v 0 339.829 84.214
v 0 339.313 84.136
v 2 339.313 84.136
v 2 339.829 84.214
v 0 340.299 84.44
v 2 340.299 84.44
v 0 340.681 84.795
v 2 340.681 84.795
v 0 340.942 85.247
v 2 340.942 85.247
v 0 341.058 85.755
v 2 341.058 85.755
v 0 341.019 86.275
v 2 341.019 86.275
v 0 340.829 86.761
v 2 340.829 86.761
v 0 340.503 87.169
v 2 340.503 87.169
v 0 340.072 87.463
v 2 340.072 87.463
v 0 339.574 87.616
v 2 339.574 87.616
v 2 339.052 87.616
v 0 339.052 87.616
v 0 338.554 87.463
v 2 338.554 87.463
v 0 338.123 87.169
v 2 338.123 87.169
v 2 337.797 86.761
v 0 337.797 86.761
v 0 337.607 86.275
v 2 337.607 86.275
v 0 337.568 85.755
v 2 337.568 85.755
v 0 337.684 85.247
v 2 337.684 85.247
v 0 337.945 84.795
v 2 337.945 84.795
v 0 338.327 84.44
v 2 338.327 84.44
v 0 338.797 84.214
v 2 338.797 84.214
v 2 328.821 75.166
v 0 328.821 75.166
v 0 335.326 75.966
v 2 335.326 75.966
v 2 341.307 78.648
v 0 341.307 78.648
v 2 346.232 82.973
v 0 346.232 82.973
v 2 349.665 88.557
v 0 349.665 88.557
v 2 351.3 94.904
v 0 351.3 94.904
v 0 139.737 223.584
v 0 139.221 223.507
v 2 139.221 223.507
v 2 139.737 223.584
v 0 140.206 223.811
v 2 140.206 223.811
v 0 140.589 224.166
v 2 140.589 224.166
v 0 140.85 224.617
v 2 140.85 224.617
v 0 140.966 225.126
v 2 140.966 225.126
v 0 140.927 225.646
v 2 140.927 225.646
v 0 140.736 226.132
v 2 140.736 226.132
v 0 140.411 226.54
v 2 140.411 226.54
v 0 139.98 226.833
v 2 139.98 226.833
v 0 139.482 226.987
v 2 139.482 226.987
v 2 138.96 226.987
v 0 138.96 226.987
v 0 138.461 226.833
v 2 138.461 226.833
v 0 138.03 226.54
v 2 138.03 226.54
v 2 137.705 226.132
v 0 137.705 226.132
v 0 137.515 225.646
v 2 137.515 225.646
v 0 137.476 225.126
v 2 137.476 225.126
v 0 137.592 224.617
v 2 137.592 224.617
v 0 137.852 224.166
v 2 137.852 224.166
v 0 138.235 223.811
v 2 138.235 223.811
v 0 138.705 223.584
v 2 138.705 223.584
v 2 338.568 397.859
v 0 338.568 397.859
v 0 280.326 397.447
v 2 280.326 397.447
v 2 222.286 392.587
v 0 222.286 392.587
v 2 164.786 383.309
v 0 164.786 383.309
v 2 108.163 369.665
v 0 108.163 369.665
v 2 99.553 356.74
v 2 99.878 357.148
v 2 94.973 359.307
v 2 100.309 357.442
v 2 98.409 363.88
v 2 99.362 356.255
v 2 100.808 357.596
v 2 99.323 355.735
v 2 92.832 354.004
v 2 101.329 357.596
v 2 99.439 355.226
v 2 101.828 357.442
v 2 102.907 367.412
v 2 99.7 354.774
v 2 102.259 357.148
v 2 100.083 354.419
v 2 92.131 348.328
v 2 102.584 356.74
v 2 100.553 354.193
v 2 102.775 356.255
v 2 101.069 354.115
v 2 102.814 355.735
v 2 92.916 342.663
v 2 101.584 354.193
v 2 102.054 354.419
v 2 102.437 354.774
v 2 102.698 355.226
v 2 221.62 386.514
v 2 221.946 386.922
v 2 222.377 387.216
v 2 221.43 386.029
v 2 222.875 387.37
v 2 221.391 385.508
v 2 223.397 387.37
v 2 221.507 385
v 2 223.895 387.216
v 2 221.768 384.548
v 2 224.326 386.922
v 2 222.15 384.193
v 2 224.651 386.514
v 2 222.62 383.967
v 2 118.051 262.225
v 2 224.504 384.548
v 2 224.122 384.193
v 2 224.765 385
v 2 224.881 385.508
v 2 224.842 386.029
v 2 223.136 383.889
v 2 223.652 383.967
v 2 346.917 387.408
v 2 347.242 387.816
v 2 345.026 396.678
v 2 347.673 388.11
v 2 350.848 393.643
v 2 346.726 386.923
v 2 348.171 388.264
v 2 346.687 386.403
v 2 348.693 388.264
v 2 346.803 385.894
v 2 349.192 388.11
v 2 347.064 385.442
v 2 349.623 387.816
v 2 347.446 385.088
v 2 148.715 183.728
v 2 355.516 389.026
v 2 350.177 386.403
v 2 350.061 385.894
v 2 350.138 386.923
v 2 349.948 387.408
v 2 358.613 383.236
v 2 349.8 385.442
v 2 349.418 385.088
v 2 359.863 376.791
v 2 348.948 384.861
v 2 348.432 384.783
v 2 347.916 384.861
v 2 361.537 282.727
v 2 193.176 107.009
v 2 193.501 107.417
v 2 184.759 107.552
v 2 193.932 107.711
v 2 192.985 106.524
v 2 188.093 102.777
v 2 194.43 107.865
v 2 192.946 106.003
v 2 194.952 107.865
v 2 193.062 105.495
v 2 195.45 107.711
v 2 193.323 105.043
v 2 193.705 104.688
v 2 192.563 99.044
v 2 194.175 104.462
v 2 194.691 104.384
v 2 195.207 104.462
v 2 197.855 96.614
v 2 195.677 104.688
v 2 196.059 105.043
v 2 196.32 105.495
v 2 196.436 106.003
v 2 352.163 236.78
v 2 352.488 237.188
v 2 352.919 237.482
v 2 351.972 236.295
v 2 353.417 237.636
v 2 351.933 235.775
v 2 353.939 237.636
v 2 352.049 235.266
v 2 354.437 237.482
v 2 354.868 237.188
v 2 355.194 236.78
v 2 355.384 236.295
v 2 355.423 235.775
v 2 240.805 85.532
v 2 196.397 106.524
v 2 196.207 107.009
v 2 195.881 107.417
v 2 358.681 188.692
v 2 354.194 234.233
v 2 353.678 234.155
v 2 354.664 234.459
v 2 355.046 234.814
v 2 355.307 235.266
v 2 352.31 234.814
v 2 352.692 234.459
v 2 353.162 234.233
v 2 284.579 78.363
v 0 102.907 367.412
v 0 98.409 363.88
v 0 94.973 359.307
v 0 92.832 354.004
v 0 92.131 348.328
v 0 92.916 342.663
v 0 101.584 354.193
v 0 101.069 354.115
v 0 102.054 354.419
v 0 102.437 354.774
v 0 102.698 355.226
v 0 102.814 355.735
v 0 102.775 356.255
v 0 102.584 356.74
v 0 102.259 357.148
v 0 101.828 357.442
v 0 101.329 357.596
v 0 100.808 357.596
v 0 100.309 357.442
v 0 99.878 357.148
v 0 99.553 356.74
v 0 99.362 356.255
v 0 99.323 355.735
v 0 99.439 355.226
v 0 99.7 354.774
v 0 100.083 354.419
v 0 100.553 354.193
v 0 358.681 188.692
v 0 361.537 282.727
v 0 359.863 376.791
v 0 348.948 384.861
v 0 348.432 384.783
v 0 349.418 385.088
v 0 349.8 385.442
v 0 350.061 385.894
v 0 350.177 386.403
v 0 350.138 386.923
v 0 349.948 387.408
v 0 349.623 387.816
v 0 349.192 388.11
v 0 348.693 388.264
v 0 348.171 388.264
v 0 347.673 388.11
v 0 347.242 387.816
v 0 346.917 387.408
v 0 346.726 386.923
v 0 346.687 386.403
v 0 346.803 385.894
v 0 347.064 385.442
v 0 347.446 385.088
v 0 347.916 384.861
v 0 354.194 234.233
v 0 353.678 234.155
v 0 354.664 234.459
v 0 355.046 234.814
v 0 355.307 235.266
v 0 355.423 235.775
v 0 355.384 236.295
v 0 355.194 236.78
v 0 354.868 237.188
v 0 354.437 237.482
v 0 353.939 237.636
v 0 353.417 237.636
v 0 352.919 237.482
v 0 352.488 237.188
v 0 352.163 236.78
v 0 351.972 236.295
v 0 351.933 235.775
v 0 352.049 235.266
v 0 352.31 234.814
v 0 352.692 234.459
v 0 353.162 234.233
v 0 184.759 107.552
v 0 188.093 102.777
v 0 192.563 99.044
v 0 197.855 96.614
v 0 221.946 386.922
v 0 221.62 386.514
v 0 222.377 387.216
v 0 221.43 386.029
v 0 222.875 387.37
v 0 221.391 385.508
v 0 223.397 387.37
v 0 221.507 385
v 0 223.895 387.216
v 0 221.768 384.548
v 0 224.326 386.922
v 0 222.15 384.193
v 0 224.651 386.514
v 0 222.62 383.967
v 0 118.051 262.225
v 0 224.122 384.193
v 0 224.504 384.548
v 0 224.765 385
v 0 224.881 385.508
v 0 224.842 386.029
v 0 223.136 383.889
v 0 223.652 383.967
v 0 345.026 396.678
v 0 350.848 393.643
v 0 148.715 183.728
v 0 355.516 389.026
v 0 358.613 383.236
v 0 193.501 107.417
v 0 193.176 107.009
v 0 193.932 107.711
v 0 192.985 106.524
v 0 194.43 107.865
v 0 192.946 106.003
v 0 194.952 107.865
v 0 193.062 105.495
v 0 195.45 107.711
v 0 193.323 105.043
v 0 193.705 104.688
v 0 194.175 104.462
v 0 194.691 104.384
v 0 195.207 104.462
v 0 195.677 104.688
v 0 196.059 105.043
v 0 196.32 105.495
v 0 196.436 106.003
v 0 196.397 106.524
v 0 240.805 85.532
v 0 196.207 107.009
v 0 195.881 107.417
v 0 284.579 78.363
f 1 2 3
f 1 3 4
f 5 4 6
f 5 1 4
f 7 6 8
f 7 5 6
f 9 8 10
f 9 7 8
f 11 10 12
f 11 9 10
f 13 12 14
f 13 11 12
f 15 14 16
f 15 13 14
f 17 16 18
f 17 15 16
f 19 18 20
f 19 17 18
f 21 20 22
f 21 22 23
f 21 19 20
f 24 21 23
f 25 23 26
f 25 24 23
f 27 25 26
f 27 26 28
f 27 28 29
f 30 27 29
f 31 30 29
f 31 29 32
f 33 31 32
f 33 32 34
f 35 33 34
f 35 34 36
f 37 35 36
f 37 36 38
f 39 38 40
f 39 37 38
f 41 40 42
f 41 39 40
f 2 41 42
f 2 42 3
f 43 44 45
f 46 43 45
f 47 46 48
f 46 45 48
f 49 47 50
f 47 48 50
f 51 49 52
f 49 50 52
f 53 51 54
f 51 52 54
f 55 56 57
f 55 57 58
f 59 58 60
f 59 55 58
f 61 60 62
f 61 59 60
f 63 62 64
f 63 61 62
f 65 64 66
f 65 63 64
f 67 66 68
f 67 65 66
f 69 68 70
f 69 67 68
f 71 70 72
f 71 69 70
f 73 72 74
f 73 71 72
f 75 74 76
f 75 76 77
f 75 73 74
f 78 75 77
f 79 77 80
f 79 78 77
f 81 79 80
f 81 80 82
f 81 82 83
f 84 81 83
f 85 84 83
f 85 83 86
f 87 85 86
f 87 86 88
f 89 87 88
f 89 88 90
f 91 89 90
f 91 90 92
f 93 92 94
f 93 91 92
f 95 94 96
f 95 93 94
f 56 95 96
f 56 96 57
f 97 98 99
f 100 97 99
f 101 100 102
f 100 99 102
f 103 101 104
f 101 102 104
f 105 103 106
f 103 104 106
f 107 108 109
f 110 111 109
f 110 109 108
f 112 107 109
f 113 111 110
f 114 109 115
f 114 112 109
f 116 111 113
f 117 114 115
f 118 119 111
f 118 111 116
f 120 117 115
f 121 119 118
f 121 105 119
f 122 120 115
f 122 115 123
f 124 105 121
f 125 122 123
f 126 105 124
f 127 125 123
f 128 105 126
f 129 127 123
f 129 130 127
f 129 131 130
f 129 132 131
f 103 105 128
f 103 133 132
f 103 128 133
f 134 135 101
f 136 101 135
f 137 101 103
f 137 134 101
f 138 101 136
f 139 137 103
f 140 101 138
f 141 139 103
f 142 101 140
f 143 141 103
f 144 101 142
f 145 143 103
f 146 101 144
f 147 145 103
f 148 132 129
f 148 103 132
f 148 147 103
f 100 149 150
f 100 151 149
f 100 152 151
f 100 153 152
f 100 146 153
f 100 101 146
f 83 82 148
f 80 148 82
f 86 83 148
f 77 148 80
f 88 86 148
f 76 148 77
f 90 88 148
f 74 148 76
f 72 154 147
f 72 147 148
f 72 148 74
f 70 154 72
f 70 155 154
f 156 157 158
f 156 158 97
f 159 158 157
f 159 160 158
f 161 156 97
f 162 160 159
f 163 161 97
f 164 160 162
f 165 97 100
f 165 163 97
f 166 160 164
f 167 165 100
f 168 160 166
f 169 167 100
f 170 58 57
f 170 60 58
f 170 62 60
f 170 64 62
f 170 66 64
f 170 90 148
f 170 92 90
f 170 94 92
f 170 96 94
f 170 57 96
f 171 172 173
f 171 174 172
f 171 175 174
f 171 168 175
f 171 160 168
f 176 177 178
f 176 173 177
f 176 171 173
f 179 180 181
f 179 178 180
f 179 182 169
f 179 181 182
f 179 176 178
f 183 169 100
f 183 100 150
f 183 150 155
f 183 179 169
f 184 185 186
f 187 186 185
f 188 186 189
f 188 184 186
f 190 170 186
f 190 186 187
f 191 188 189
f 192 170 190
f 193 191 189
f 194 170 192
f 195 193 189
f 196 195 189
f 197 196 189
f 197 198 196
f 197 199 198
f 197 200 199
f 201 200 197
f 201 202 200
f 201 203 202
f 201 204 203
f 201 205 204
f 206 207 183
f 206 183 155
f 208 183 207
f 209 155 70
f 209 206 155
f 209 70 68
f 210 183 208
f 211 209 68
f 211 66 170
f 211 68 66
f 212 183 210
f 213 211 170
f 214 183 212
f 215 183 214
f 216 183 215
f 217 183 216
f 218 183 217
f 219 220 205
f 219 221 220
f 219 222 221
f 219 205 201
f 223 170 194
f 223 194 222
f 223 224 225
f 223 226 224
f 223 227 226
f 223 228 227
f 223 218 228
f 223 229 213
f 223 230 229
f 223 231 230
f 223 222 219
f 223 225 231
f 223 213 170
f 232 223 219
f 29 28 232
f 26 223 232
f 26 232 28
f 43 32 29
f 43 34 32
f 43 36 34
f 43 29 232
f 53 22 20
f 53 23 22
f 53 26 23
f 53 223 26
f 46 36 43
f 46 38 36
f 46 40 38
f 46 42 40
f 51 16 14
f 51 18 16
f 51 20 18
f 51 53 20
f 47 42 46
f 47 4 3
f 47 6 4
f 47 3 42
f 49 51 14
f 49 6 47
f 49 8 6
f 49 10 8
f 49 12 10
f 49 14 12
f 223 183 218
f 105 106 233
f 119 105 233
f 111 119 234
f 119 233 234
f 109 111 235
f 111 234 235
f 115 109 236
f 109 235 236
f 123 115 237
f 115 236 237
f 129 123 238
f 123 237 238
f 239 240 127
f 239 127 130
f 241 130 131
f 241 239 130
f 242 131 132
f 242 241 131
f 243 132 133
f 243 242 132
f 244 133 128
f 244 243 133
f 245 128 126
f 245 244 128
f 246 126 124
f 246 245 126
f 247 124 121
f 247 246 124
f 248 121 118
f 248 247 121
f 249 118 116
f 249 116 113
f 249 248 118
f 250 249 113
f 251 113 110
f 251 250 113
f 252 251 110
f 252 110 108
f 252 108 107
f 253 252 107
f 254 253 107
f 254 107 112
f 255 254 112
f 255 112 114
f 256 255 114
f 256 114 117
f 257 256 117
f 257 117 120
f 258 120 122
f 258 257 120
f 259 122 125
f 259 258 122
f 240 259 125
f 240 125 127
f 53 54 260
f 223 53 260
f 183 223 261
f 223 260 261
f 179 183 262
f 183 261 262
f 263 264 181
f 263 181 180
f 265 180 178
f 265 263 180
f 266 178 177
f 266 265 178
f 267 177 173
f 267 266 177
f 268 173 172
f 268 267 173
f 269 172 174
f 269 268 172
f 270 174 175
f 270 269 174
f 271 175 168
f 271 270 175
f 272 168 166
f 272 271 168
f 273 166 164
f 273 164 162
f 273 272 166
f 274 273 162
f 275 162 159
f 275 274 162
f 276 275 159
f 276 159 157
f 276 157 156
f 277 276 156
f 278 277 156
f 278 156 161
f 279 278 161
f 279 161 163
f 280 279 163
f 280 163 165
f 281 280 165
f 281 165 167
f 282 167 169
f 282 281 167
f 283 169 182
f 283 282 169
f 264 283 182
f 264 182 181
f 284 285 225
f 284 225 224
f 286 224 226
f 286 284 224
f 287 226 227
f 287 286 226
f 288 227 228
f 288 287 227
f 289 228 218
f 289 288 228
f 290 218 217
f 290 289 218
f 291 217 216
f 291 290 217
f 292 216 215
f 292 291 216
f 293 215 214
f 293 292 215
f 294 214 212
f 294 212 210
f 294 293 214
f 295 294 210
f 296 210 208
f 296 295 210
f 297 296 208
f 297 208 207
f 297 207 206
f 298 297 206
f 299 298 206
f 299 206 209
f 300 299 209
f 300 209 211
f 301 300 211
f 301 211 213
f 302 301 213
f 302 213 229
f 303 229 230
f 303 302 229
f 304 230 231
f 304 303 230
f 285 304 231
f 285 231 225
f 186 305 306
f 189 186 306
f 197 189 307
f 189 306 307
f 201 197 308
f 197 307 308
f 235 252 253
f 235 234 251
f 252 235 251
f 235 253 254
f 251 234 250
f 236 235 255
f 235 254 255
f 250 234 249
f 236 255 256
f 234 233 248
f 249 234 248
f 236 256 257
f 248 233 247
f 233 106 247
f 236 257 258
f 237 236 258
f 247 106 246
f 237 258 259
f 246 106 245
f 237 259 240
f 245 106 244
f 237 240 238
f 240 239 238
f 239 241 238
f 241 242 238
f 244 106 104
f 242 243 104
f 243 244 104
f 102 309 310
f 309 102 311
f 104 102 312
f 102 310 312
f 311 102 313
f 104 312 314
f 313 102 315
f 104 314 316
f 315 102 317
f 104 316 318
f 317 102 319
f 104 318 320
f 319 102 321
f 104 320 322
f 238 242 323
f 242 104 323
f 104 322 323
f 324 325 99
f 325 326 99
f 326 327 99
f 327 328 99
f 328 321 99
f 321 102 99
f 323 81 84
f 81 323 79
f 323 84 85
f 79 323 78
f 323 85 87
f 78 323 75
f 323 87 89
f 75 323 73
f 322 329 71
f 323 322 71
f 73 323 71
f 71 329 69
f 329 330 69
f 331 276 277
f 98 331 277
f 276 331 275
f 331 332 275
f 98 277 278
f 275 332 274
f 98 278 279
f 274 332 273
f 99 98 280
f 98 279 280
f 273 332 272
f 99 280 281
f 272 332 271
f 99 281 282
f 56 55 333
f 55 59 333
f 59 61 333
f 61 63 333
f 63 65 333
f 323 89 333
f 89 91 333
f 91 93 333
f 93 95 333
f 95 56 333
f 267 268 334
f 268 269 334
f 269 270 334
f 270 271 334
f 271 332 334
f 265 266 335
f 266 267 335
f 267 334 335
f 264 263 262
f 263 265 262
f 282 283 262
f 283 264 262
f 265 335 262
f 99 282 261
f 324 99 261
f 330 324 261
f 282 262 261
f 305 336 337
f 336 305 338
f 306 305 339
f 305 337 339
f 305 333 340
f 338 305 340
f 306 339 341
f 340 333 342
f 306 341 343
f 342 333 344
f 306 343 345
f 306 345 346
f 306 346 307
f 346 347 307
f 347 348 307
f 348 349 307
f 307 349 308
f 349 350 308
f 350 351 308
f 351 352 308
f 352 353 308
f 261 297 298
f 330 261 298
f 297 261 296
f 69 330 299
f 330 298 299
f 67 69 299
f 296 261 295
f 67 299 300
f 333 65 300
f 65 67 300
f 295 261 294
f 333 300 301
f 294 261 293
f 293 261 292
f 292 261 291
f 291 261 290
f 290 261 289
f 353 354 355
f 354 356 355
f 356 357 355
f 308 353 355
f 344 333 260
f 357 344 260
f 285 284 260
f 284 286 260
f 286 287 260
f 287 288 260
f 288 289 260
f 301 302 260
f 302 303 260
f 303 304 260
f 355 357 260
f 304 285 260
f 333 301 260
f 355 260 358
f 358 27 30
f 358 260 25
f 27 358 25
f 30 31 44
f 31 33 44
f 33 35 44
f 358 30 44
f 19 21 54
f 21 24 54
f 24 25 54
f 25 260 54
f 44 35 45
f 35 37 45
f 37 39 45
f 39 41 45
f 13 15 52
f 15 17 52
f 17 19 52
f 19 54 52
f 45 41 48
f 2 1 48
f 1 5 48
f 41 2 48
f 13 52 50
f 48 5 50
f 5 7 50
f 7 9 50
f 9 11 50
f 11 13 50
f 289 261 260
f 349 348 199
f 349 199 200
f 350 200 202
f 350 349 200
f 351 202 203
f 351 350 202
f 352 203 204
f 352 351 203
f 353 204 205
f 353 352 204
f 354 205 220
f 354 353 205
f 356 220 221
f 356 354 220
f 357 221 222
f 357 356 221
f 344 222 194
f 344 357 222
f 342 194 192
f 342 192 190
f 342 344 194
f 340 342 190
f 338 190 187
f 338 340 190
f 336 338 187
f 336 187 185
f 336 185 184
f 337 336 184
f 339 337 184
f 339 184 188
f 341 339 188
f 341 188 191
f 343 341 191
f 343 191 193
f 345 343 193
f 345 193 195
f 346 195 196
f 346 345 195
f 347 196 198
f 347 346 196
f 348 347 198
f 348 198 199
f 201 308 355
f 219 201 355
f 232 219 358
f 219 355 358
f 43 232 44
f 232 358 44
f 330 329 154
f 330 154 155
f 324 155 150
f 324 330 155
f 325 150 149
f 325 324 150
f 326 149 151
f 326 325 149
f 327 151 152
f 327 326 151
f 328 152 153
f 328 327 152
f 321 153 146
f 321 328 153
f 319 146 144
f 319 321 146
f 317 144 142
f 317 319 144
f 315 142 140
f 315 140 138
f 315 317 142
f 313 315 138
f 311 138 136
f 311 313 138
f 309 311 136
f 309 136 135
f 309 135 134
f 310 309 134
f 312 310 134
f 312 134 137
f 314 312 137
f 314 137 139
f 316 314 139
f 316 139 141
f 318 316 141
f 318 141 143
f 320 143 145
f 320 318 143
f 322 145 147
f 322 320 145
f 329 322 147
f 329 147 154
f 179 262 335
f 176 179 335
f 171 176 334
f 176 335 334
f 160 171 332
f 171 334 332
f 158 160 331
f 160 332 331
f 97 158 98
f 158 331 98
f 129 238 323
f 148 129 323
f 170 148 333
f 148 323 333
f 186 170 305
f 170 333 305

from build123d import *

# Parameters (mm, degrees)
CROQUIS2_R              = 1.75
SALIENTE_EXTRUIR1_DEPTH = 2


with BuildPart() as part:
    # Croquis2 → Saliente-Extruir1 (new body)
    with BuildSketch(Plane(origin=(0, 0, 0), x_dir=(0, 0, -1), z_dir=(1, 0, 0))):
        with BuildLine():
            ThreePointArc((-96.614142786, 197.855252051), (-81.453806027, 262.611499523), (-75.165534077, 328.820751393))
            ThreePointArc((-75.165534077, 328.820751393), (-80.625986242, 343.931649954), (-94.904004852, 351.300094686))
            ThreePointArc((-94.904004852, 351.300094686), (-235.692785429, 360.674969525), (-376.791015079, 359.863425139))
            ThreePointArc((-376.791015079, 359.863425139), (-391.509654572, 353.355396757), (-397.859422485, 338.567792847))
            ThreePointArc((-397.859422485, 338.567792847), (-392.587269832, 222.285598409), (-369.665474686, 108.163139426))
            ThreePointArc((-369.665474686, 108.163139426), (-359.307110382, 94.973091226), (-342.66254386, 92.916033167))
            ThreePointArc((-342.66254386, 92.916033167), (-222.709683854, 132.700513572), (-107.551722613, 184.759494235))
            ThreePointArc((-107.551722613, 184.759494235), (-100.761654757, 190.203841513), (-96.614142786, 197.855252051))
        make_face()
        with Locations((-85.886008555, 339.31297425)):
            Circle(CROQUIS2_R, mode=Mode.SUBTRACT)
        with Locations((-235.905337517, 353.678197297)):
            Circle(CROQUIS2_R, mode=Mode.SUBTRACT)
        with Locations((-386.533430085, 348.4322687)):
            Circle(CROQUIS2_R, mode=Mode.SUBTRACT)
        with Locations((-385.639096494, 223.135826186)):
            Circle(CROQUIS2_R, mode=Mode.SUBTRACT)
        with Locations((-355.865347904, 101.068521567)):
            Circle(CROQUIS2_R, mode=Mode.SUBTRACT)
        with Locations((-225.256716861, 139.220684034)):
            Circle(CROQUIS2_R, mode=Mode.SUBTRACT)
        with Locations((-106.134267637, 194.691048979)):
            Circle(CROQUIS2_R, mode=Mode.SUBTRACT)
    extrude(amount=SALIENTE_EXTRUIR1_DEPTH)


solid = part.part
